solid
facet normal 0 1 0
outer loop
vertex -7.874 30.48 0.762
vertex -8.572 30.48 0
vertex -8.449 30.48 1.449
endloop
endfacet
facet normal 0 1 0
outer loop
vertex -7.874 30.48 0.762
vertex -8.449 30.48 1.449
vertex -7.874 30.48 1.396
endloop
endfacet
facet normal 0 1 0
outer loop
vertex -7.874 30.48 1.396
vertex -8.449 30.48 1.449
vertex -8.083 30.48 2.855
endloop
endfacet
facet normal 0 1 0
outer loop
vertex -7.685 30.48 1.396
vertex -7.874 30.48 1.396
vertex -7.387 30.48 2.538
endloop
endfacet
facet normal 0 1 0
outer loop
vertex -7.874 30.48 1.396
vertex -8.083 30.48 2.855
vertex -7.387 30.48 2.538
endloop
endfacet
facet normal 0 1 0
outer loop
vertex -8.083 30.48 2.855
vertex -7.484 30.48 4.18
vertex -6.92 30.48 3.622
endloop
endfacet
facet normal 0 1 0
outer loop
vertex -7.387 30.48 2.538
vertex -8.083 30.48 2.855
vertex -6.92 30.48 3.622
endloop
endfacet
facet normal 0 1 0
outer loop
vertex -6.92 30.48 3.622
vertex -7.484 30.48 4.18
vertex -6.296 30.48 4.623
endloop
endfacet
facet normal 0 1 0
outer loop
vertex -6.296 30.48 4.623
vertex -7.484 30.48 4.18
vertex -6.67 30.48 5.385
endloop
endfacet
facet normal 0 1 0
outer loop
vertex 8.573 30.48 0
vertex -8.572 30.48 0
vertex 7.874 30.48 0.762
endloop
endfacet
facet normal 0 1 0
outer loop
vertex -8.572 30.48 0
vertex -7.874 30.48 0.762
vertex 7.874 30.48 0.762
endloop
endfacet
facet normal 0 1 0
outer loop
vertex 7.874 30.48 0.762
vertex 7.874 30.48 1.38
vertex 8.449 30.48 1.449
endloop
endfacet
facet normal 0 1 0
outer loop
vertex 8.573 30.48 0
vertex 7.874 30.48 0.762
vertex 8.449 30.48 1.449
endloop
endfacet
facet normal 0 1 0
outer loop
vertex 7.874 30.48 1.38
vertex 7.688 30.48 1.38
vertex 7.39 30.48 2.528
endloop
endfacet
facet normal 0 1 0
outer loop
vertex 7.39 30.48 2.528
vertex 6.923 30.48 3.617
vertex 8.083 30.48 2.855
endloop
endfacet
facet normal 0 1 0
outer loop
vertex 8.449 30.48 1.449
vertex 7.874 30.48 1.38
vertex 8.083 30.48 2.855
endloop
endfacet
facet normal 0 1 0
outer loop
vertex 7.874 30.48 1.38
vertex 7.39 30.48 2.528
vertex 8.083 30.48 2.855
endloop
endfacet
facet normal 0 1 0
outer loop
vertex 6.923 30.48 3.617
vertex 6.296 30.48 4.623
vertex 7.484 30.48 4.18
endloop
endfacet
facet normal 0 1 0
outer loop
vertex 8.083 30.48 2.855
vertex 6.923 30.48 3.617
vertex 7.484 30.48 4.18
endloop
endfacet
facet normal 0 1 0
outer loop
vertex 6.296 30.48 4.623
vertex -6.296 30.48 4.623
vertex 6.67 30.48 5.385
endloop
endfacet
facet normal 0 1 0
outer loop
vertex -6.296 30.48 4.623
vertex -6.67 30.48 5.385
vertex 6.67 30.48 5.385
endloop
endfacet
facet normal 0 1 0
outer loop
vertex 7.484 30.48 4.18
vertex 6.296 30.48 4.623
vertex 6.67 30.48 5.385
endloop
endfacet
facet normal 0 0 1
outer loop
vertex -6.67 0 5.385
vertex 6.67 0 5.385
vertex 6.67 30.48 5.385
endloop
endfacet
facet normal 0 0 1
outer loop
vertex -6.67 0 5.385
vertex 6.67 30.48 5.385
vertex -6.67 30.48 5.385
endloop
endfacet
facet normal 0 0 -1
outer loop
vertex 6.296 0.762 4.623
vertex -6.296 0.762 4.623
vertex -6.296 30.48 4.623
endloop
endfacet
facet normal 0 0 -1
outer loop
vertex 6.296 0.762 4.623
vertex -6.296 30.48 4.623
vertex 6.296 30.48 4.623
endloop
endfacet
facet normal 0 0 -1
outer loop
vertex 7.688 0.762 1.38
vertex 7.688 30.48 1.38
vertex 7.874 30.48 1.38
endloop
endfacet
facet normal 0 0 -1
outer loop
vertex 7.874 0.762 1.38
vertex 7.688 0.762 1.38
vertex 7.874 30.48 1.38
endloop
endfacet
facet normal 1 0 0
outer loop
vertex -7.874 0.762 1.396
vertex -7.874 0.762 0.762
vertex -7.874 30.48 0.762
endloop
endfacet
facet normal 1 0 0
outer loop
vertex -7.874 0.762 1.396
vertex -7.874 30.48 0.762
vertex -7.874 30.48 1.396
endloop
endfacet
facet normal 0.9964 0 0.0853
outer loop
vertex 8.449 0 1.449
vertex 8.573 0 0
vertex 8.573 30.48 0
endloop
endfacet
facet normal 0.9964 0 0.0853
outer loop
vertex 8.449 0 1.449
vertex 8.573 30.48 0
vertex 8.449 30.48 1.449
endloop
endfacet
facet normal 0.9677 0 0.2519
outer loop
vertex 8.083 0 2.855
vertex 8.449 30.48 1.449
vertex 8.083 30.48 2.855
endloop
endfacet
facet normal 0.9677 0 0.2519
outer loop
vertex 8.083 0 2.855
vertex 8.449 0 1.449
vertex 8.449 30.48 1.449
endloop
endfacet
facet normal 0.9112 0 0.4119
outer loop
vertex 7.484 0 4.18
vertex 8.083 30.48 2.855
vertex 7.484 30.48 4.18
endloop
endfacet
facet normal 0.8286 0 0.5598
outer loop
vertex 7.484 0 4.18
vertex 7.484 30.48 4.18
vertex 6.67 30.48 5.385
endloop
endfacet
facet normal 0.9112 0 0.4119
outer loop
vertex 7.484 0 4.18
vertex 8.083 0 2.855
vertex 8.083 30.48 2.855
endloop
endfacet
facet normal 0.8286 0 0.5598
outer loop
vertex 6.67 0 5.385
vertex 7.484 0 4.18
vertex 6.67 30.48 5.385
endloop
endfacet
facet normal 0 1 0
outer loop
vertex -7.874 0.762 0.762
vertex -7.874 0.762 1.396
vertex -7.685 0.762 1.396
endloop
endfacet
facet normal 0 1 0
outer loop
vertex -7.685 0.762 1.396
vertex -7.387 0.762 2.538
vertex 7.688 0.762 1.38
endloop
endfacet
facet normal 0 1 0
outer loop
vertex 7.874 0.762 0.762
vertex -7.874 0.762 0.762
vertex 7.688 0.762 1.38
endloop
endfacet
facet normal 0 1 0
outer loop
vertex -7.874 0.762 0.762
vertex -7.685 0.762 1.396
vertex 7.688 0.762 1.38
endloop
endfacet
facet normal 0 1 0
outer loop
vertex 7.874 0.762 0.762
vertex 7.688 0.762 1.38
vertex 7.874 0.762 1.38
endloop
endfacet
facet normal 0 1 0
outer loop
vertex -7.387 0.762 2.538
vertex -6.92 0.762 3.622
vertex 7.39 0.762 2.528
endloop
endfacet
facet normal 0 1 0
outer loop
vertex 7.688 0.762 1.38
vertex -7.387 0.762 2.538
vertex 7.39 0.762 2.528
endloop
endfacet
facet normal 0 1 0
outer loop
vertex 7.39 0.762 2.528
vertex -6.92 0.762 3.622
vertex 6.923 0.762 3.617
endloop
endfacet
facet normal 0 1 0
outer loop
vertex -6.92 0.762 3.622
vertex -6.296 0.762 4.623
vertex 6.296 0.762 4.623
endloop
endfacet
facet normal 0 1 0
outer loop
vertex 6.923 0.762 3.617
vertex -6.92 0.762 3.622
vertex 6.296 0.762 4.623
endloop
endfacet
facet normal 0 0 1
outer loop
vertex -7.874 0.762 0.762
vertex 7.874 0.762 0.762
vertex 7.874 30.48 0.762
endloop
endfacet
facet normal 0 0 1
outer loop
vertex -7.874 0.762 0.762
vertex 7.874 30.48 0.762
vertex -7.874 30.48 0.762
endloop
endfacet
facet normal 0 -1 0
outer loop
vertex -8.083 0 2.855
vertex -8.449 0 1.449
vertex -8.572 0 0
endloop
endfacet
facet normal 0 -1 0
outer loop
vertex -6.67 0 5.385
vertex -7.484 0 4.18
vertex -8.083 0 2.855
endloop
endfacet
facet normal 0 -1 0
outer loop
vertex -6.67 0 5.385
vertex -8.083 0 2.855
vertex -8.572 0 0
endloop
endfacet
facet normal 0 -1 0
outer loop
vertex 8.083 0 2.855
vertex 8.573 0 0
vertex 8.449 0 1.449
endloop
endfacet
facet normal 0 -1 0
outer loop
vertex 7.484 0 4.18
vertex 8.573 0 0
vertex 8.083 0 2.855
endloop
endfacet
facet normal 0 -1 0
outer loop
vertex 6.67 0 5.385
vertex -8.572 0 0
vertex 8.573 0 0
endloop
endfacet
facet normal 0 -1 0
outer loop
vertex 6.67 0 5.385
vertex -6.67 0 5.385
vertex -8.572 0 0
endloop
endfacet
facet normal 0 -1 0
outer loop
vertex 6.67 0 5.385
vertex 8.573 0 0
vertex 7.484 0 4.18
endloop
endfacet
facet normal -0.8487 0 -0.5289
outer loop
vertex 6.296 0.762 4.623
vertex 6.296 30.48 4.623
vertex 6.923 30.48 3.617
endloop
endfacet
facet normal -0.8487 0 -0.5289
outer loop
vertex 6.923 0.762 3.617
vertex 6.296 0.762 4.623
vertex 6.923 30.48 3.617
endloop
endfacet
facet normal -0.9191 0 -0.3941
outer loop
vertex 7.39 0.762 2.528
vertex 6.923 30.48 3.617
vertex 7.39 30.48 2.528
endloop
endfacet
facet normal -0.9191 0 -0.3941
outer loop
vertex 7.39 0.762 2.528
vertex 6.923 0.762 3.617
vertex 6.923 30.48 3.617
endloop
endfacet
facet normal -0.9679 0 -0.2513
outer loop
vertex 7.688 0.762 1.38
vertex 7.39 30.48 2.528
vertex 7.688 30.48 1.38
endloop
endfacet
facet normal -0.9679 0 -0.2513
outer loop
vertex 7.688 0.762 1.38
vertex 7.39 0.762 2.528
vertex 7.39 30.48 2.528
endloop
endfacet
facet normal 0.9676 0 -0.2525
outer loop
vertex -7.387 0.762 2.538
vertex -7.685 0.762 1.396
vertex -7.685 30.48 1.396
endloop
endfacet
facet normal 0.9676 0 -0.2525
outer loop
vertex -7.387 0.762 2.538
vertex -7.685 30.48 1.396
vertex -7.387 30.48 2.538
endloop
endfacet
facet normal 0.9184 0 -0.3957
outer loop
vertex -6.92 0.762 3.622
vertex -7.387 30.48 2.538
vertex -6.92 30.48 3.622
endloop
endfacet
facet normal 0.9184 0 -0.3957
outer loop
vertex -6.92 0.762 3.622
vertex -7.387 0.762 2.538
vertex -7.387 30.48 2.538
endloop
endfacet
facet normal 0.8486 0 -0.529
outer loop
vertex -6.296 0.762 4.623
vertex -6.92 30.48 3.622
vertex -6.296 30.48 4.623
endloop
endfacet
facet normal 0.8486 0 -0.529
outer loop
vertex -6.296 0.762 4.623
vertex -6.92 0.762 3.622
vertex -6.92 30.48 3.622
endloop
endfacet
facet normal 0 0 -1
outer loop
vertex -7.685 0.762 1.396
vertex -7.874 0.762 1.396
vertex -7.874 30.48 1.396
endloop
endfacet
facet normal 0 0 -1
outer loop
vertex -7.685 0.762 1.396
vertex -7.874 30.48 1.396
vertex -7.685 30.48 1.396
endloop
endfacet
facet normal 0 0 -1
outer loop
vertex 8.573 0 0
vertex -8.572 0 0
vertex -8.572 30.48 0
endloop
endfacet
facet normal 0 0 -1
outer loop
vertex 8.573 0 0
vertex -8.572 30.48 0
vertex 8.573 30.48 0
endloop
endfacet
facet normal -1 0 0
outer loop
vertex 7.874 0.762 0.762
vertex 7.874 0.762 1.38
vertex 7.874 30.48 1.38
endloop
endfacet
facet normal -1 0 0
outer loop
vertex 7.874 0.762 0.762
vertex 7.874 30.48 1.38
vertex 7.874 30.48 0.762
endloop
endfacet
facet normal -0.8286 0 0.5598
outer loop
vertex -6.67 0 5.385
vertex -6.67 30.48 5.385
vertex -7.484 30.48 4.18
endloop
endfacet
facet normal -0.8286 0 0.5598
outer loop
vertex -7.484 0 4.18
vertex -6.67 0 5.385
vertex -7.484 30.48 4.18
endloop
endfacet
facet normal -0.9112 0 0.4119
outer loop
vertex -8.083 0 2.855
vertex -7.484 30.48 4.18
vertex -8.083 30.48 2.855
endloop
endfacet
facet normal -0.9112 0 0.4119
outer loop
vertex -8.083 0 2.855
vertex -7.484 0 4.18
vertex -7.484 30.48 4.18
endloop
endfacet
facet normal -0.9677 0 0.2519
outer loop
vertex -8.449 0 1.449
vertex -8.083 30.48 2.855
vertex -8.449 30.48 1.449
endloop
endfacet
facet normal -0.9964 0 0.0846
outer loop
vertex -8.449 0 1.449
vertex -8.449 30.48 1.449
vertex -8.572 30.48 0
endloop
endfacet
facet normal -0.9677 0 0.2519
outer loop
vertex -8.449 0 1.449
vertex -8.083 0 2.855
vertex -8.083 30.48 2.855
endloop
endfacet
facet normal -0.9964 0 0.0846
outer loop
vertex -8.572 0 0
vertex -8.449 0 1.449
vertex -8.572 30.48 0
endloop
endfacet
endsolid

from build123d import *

# Parameters (mm, degrees)
F1_DEPTH = 30.48
F3_DEPTH = 0.762


with BuildPart() as f1:
    # F0 (on Front) → F1 (new body)
    with BuildSketch(Plane.XZ):
        with BuildLine():
            Line((-8.5725, 0), (8.5725, 0))
            ThreePointArc((8.5725, 0), (8.082949, 2.855468), (6.670209, 5.3848))
            Line((6.670209, 5.3848), (-6.670209, 5.3848))
            ThreePointArc((-6.670209, 5.3848), (-8.082949, 2.855468), (-8.5725, 0))
        make_face()
        with BuildLine():
            ThreePointArc((-7.684708, 1.396131), (-7.173881, 3.088582), (-6.295525, 4.6228))
            Line((-6.295525, 4.6228), (6.295525, 4.6228))
            ThreePointArc((6.295525, 4.6228), (7.177049, 3.081214), (7.687559, 1.380345))
            Line((7.687559, 1.380345), (7.874, 1.380345))
            Line((7.874, 1.380345), (7.874, 0.762))
            Line((7.874, 0.762), (7.77324, 0.762))
            Line((7.77324, 0.762), (-7.77324, 0.762))
            Line((-7.77324, 0.762), (-7.874, 0.762))
            Line((-7.874, 0.762), (-7.874, 1.396131))
            Line((-7.874, 1.396131), (-7.684708, 1.396131))
        make_face(mode=Mode.SUBTRACT)
    extrude(amount=-F1_DEPTH)

    # F2 (on face) → F3 (join)
    with BuildSketch(Plane.XZ):
        with BuildLine():
            ThreePointArc((-6.295525, 4.6228), (-7.173881, 3.088582), (-7.684708, 1.396131))
            Line((-7.684708, 1.396131), (-7.874, 1.396131))
            Line((-7.874, 1.396131), (-7.874, 0.762))
            Line((-7.874, 0.762), (7.874, 0.762))
            Line((7.874, 0.762), (7.874, 1.380345))
            Line((7.874, 1.380345), (7.687559, 1.380345))
            ThreePointArc((7.687559, 1.380345), (7.177049, 3.081214), (6.295525, 4.6228))
            Line((6.295525, 4.6228), (-6.295525, 4.6228))
        make_face()
    extrude(amount=-F3_DEPTH)


solid = f1.part
